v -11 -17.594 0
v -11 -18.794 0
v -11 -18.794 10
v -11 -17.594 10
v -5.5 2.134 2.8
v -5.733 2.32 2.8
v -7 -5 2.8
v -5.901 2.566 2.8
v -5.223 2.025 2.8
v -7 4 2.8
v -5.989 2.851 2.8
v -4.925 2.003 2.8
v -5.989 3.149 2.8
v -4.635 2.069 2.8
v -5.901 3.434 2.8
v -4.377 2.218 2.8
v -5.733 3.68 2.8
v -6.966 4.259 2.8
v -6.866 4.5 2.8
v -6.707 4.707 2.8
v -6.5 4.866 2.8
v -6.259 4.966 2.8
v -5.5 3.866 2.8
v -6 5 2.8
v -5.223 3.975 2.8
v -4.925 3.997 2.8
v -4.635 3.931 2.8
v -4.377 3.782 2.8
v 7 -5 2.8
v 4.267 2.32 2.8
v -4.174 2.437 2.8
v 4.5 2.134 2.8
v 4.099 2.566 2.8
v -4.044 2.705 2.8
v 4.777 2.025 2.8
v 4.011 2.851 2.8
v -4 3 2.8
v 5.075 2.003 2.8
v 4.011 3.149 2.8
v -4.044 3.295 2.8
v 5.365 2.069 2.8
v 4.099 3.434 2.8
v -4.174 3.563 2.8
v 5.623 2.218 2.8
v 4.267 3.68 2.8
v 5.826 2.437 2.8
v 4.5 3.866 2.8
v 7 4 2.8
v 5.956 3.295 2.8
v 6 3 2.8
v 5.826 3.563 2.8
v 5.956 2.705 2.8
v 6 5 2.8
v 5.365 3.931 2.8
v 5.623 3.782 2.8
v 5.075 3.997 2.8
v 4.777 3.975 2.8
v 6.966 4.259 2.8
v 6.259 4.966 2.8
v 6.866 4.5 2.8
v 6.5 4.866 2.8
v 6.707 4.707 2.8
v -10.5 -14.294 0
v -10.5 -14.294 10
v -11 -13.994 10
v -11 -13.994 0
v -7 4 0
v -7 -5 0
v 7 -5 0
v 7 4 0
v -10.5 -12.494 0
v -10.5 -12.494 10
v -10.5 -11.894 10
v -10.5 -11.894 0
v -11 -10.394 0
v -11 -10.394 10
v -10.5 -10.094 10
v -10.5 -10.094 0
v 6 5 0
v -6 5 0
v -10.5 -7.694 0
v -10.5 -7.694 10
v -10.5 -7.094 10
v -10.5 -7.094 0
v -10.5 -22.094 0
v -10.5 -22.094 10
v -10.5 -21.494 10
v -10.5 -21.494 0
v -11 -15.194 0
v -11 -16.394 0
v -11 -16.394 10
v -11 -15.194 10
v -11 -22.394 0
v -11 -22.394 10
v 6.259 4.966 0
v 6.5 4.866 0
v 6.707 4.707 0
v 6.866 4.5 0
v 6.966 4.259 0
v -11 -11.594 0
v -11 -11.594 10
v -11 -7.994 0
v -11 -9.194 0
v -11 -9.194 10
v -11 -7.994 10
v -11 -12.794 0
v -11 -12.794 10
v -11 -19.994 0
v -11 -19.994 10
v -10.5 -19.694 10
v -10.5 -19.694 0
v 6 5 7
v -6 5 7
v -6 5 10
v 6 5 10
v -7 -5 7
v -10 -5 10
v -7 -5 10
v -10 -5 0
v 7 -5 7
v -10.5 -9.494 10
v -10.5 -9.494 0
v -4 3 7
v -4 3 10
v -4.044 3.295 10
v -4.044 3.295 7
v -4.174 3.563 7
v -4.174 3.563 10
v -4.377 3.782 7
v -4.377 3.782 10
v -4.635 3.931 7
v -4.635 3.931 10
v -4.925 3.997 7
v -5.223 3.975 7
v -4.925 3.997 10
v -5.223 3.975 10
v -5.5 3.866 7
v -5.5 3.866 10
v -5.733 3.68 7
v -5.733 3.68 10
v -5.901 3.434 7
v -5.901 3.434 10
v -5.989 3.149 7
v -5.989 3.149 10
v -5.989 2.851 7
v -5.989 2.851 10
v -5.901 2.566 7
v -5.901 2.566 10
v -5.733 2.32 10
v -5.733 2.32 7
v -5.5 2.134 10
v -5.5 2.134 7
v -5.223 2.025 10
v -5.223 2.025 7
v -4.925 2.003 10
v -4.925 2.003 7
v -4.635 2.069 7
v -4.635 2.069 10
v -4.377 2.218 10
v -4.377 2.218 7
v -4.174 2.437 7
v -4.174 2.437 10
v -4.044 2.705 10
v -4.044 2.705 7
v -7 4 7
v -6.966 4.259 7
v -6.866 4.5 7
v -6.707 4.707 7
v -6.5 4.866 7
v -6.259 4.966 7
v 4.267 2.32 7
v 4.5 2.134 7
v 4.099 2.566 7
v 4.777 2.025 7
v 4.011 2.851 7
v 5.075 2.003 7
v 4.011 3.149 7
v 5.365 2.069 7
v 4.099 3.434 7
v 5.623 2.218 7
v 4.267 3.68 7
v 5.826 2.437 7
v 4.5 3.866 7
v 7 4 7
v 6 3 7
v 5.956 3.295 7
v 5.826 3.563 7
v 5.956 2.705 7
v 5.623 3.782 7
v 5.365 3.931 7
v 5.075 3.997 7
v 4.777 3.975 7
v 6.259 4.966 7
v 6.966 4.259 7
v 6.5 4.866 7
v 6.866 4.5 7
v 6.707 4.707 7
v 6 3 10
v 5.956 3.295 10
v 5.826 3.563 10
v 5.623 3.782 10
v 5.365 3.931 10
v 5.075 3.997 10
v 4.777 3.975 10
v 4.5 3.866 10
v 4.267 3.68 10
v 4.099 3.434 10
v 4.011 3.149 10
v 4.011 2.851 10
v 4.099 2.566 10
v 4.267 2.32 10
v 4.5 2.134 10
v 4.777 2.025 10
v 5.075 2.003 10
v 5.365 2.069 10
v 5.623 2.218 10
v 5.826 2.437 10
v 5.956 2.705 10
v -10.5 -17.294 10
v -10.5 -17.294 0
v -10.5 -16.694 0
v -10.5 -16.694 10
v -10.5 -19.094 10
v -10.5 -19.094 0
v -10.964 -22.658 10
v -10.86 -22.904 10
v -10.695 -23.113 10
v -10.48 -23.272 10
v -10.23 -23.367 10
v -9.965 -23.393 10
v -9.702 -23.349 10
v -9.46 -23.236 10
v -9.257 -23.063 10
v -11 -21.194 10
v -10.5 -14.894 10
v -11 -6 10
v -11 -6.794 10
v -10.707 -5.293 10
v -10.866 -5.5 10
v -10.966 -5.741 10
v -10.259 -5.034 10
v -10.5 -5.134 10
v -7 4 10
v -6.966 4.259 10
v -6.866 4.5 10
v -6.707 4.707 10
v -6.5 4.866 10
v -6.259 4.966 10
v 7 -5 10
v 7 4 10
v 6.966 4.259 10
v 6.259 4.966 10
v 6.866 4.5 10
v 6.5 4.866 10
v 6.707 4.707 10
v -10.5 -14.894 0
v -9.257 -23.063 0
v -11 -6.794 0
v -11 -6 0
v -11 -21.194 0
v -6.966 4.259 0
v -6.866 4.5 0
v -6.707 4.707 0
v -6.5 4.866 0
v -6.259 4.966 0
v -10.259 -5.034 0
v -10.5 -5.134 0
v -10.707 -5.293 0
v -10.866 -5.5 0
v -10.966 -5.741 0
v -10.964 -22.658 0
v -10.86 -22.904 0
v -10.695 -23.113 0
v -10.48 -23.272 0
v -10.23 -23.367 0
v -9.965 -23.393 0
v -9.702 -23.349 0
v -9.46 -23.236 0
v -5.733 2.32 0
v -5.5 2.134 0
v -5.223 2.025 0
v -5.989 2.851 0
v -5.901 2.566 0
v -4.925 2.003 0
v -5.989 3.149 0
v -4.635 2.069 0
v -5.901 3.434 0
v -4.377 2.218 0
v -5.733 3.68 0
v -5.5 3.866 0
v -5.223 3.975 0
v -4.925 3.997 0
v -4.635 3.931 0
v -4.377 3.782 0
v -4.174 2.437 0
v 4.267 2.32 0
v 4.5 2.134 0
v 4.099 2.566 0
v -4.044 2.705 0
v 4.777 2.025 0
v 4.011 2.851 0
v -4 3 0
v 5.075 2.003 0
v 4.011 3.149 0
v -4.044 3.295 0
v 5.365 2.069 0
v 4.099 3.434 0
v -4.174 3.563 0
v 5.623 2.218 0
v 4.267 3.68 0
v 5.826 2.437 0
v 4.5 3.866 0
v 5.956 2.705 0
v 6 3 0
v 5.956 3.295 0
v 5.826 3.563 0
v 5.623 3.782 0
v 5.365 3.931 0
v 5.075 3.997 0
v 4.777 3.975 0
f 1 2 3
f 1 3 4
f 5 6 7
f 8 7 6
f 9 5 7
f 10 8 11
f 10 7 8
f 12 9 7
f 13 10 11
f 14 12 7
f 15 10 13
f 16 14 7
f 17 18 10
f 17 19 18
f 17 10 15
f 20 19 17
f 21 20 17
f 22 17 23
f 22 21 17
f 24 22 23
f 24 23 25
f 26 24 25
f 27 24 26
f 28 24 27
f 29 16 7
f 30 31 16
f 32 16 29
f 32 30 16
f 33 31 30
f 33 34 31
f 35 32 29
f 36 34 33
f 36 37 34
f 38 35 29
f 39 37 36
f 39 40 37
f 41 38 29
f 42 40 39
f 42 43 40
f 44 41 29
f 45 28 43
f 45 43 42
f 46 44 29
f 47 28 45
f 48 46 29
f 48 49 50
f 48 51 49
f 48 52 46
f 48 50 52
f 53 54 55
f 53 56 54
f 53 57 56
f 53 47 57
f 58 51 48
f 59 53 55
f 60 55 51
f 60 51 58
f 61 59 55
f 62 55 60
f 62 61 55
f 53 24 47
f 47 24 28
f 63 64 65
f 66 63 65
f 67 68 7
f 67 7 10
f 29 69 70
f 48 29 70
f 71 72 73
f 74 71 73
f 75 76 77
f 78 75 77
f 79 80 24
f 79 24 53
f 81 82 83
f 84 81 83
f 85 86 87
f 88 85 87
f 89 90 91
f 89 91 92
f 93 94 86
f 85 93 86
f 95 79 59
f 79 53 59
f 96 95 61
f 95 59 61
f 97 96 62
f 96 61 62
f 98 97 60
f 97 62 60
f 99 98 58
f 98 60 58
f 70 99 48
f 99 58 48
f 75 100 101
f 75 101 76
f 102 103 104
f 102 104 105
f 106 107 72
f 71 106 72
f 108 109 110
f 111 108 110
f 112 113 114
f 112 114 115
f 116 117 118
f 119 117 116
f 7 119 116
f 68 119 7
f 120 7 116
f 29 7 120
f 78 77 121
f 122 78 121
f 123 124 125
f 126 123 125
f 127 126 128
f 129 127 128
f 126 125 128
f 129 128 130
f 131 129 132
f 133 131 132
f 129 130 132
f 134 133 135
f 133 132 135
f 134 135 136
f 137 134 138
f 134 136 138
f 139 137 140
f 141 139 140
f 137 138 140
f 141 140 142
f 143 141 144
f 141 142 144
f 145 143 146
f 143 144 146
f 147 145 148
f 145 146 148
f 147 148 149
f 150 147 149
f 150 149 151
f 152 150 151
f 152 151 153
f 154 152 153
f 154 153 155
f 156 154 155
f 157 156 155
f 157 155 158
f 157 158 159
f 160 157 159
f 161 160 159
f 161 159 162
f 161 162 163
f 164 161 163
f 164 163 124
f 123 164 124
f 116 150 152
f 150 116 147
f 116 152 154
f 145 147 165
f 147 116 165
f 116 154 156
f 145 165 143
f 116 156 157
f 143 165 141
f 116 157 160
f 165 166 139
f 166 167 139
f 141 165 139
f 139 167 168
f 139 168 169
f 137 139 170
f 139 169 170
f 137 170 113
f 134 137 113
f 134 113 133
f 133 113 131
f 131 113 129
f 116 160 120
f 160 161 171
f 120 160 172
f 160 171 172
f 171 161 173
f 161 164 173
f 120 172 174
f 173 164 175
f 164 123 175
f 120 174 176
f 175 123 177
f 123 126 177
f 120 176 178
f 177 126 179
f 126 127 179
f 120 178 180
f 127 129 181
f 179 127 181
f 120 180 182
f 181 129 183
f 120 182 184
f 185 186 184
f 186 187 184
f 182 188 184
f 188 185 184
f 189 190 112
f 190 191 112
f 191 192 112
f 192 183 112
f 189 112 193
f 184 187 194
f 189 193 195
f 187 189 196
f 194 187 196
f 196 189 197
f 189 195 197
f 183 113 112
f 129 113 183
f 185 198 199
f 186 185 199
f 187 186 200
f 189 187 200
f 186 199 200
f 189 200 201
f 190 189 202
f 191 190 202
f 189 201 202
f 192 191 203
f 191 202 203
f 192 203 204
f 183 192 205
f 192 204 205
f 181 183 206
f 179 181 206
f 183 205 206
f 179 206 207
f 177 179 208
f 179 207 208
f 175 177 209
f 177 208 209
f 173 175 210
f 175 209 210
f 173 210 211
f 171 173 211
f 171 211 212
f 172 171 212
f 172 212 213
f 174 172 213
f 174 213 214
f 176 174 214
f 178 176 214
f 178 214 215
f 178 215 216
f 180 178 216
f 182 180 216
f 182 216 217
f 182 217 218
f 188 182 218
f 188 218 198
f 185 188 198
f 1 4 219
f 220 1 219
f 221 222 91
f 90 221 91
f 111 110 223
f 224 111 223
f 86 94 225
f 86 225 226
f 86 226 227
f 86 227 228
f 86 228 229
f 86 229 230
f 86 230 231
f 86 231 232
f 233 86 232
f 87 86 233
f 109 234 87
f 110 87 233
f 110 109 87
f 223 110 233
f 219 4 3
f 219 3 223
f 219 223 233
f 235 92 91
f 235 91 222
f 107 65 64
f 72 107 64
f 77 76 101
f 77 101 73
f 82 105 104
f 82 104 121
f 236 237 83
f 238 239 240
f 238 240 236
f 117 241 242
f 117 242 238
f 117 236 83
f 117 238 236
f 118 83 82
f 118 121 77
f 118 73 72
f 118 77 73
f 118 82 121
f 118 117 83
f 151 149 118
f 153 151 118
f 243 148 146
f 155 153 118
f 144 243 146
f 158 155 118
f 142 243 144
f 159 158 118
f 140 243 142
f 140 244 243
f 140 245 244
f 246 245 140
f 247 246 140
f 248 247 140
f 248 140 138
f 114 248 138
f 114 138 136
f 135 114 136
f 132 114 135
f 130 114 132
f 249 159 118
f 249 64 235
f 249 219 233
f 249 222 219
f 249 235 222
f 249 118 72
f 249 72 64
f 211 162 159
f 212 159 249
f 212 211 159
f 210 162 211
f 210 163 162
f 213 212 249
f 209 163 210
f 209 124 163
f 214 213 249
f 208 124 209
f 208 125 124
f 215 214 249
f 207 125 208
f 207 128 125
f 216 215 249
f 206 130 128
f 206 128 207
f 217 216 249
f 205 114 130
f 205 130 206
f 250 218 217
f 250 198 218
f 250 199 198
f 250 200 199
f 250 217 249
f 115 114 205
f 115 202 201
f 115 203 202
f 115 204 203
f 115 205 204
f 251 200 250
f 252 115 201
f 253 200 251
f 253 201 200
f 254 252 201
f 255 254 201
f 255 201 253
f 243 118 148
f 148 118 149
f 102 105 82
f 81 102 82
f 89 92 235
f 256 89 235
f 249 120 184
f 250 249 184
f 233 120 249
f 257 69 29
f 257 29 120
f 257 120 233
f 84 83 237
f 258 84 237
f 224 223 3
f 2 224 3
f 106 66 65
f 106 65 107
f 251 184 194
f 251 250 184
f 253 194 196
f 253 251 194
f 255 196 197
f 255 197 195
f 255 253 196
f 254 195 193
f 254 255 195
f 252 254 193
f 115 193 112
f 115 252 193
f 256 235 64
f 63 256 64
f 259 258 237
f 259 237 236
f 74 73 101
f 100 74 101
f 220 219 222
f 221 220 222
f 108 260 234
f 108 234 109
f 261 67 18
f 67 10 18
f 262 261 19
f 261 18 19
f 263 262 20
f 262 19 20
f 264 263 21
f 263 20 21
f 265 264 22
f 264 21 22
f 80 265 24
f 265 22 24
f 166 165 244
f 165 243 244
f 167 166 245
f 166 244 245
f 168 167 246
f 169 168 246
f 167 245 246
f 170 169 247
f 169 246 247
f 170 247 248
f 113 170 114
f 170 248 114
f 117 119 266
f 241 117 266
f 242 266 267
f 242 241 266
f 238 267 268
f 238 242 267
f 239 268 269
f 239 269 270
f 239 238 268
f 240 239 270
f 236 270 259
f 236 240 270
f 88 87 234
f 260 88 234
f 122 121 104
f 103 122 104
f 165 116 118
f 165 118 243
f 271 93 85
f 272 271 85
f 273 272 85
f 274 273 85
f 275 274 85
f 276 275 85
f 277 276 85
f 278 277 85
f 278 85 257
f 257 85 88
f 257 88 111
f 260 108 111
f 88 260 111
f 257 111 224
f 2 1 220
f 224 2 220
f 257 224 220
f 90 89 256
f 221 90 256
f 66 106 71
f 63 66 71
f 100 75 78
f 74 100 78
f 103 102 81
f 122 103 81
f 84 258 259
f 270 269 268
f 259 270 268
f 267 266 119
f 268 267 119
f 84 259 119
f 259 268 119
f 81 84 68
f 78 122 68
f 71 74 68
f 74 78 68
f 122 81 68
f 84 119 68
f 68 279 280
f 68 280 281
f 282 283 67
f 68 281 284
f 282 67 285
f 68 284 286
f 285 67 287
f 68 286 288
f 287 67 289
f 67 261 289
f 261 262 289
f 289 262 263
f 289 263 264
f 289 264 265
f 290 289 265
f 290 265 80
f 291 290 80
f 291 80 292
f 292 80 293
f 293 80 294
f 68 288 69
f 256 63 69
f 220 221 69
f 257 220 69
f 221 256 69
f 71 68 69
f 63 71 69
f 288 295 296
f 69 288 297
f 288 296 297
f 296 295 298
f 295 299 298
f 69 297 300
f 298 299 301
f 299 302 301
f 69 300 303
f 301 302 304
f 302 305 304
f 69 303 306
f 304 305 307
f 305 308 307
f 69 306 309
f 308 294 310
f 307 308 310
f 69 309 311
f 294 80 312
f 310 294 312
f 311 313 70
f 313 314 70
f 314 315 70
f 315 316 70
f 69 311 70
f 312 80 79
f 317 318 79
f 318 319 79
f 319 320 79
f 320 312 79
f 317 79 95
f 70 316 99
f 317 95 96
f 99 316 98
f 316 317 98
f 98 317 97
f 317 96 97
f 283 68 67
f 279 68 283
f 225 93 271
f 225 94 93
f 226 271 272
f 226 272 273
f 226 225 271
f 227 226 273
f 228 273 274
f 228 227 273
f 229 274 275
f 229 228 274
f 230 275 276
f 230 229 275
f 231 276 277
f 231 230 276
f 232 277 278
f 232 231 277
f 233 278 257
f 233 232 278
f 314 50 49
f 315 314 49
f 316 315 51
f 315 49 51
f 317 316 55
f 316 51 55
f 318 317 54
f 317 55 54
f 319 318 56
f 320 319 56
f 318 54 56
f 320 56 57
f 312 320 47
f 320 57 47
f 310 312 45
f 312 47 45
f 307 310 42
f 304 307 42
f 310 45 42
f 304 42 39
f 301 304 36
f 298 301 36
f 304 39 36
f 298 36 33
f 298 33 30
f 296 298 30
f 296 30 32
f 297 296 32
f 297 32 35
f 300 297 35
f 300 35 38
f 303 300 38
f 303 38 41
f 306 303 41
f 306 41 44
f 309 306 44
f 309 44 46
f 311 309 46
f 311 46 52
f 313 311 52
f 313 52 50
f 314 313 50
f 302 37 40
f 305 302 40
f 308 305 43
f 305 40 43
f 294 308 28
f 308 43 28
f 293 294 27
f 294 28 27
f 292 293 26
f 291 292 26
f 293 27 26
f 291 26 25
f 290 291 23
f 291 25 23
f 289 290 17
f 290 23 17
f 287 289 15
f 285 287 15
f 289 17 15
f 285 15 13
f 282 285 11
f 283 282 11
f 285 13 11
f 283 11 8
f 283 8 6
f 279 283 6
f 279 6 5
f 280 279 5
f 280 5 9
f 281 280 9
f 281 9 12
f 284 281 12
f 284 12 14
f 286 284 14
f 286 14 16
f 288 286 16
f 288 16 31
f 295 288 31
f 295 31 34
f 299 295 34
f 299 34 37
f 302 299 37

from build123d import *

# Parameters (mm, degrees)
SKETCH_1_W             = 14
SKETCH_1_H             = 10
EXTRUDE_1_DEPTH        = 10
SKETCH_2_R             = 1
CUT_EXTRUDE_1_DEPTH    = 10
SKETCH_3_W             = 14
SKETCH_3_H             = 4.2
CUT_EXTRUDE_2_DEPTH    = 10
FILLET_1_R             = 1
CUT_EXTRUDE_START      = -10
CUT_EXTRUDE_3_DEPTH    = 38.71788575
PATTERN_LINEAR_1_COUNT = 7
PATTERN_LINEAR_1_PITCH = 2.4
FILLET_2_R             = 1


with BuildPart() as part:
    # 草图1 → 凸台-拉伸1 (new body)
    with BuildSketch(Plane.XY):
        Rectangle(SKETCH_1_W, SKETCH_1_H)
        Polygon((-11, -5), (-7, -5), (7, -5), (-11, -25), align=None)
    extrude(amount=EXTRUDE_1_DEPTH)

    # 草图2 → 切除-拉伸1 (cut)
    with BuildSketch(Plane.XY.offset(10)):
        with Locations((-5, 3)):
            Circle(SKETCH_2_R)
        with Locations((5, 3)):
            Circle(SKETCH_2_R)
    extrude(amount=-CUT_EXTRUDE_1_DEPTH, mode=Mode.SUBTRACT)

    # 草图3 → 切除-拉伸2 (cut)
    with BuildSketch(Plane(origin=(0, 5, 0), x_dir=(1, 0, 0), z_dir=(0, 1, 0))):
        with Locations((0, -4.9)):
            Rectangle(SKETCH_3_W, SKETCH_3_H)
    extrude(amount=-CUT_EXTRUDE_2_DEPTH, mode=Mode.SUBTRACT)

    # 圆角1
    fillet_1_edges = [part.edges().sort_by_distance(p)[0] for p in [
        (-11, -25, 5),
        (-11, -5, 5),
    ]]
    fillet(fillet_1_edges, radius=FILLET_1_R)

    # 草图5 → 切除-拉伸3 (cut)
    with BuildSketch(Plane.XY.offset(10).offset(CUT_EXTRUDE_START)):
        Polygon((-75.789683565, -61.267851911), (-11, -22.394041773), (-10.5, -22.094041773), (-10.5, -21.494041773), (-11, -21.194041773), (-75.789683565, 17.679768366), (-226.903894824, 17.679768366), (-226.903894824, -61.267851911), align=None)
    cut_extrude_3 = extrude(amount=CUT_EXTRUDE_3_DEPTH, mode=Mode.SUBTRACT)

    # 阵列(线性)1: 切除-拉伸3 ×7
    with Locations(*[(0, i * PATTERN_LINEAR_1_PITCH, 0) for i in range(1, PATTERN_LINEAR_1_COUNT)]):
        add(cut_extrude_3, mode=Mode.SUBTRACT)

    # 圆角2
    fillet_2_edges = [part.edges().sort_by_distance(p)[0] for p in [
        (-7, 5, 8.5),
        (7, 5, 8.5),
        (-7, 5, 1.4),
        (7, 5, 1.4),
    ]]
    fillet(fillet_2_edges, radius=FILLET_2_R)


solid = part.part
